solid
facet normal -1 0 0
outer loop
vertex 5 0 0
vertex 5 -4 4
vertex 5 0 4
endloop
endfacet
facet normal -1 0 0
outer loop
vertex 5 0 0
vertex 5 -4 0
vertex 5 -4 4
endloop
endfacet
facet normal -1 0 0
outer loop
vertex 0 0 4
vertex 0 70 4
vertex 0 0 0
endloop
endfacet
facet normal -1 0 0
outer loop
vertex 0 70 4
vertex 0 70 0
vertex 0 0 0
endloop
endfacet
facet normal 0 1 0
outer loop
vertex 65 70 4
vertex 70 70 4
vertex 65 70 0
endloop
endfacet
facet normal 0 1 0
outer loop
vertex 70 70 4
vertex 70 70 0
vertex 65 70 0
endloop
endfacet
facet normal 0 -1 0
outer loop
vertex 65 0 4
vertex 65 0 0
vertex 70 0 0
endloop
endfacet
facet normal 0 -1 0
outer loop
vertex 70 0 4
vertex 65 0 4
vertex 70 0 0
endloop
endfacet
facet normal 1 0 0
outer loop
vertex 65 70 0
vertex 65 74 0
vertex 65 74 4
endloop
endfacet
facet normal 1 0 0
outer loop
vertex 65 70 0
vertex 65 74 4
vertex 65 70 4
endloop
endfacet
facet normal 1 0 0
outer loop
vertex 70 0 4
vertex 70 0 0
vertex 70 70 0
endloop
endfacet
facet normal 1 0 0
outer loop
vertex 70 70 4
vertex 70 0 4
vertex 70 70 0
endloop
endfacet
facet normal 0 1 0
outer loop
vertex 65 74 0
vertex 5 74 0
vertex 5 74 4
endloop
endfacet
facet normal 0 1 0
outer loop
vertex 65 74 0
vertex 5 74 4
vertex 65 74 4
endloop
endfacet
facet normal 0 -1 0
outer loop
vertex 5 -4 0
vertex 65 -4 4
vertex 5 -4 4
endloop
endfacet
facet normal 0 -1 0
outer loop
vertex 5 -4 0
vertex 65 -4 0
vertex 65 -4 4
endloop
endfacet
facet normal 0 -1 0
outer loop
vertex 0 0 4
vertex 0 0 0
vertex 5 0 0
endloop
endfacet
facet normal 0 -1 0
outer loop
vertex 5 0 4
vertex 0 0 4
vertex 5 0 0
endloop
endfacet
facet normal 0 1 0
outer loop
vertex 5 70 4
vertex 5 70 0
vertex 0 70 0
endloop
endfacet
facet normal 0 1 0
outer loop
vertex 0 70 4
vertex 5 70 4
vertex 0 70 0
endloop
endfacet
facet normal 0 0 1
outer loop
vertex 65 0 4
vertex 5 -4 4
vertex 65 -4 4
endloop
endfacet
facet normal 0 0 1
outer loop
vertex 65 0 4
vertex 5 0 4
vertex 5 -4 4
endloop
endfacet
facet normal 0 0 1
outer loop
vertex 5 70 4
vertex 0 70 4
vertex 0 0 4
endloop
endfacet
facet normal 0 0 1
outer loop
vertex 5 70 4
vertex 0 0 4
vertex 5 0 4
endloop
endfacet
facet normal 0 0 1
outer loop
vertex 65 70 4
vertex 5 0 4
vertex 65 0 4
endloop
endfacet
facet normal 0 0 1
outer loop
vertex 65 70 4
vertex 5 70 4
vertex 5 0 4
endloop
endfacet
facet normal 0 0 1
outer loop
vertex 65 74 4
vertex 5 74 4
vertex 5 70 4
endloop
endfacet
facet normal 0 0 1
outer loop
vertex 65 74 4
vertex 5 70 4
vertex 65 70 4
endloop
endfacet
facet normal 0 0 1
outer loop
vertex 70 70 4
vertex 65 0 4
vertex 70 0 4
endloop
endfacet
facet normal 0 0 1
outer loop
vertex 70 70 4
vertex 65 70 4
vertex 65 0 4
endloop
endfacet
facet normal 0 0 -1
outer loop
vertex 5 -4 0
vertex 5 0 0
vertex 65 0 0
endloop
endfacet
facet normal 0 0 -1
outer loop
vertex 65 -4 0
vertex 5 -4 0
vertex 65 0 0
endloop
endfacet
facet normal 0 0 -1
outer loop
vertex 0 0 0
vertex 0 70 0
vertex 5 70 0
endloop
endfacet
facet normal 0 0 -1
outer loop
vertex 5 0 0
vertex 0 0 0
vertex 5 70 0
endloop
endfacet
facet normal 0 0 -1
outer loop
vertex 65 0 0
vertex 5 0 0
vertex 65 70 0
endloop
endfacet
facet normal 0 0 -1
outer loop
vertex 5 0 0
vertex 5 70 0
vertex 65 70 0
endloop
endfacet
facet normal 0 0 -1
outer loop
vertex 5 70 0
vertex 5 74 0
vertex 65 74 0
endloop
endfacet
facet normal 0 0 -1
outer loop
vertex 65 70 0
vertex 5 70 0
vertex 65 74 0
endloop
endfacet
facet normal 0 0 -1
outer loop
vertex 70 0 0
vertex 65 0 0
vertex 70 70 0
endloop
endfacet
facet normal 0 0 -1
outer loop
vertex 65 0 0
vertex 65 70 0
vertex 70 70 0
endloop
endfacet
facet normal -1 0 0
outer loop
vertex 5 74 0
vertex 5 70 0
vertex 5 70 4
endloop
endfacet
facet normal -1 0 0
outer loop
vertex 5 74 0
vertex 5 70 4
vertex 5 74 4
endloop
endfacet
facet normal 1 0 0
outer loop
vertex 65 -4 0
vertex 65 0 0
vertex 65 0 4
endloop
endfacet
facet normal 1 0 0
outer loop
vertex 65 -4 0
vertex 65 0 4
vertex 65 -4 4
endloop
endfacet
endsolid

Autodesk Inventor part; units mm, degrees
ref_plane "YZ Plane" through (0, 0, 0) normal (1, 0, 0) x (0, 1, 0)
ref_plane "XZ Plane" through (0, 0, 0) normal (0, 1, 0) x (-1, 0, 0)
ref_plane "XY Plane" through (0, 0, 0) normal (0, 0, 1) x (1, 0, 0)
sketch "Sketch1" plane through (0, 0, 0) normal (0, 0, 1) x (1, 0, 0)
  line L0 (0, 0) -> (70, 0)
  line L1 (70, 0) -> (70, 70)
  line L2 (70, 70) -> (0, 70)
  line L3 (0, 70) -> (0, 0)
  line L4 (5, 74) -> (65, 74)
  line L5 (65, 74) -> (65, -4)
  line L6 (65, -4) -> (5, -4)
  line L7 (5, -4) -> (5, 74)
  line L8 (31, 41.5) -> (39, 41.5)
  line L9 (39, 41.5) -> (39, 28.5)
  line L10 (39, 28.5) -> (31, 28.5)
  line L11 (31, 28.5) -> (31, 41.5)
  point P0 (5, 0)
  point P1 (65, 0)
  point P2 (65, 70)
  point P3 (5, 70)
  dimension "d0" = 70
  dimension "d1" = 70
  dimension "d2" = 4
  dimension "d3" = 5
  dimension "d4" = 5
  dimension "d5" = 4
  dimension "d6" = 13
  dimension "d7" = 8
  dimension "d8" = 26
  dimension "d9" = 28.5
extrude "Extrusion1" add sketch "Sketch1" along normal blind 4
extrude "Extrusion2" add sketch "Sketch1" along normal blind 4 contours L8 L9 L10 L11
properties part number "Tussen60_8AUG"
